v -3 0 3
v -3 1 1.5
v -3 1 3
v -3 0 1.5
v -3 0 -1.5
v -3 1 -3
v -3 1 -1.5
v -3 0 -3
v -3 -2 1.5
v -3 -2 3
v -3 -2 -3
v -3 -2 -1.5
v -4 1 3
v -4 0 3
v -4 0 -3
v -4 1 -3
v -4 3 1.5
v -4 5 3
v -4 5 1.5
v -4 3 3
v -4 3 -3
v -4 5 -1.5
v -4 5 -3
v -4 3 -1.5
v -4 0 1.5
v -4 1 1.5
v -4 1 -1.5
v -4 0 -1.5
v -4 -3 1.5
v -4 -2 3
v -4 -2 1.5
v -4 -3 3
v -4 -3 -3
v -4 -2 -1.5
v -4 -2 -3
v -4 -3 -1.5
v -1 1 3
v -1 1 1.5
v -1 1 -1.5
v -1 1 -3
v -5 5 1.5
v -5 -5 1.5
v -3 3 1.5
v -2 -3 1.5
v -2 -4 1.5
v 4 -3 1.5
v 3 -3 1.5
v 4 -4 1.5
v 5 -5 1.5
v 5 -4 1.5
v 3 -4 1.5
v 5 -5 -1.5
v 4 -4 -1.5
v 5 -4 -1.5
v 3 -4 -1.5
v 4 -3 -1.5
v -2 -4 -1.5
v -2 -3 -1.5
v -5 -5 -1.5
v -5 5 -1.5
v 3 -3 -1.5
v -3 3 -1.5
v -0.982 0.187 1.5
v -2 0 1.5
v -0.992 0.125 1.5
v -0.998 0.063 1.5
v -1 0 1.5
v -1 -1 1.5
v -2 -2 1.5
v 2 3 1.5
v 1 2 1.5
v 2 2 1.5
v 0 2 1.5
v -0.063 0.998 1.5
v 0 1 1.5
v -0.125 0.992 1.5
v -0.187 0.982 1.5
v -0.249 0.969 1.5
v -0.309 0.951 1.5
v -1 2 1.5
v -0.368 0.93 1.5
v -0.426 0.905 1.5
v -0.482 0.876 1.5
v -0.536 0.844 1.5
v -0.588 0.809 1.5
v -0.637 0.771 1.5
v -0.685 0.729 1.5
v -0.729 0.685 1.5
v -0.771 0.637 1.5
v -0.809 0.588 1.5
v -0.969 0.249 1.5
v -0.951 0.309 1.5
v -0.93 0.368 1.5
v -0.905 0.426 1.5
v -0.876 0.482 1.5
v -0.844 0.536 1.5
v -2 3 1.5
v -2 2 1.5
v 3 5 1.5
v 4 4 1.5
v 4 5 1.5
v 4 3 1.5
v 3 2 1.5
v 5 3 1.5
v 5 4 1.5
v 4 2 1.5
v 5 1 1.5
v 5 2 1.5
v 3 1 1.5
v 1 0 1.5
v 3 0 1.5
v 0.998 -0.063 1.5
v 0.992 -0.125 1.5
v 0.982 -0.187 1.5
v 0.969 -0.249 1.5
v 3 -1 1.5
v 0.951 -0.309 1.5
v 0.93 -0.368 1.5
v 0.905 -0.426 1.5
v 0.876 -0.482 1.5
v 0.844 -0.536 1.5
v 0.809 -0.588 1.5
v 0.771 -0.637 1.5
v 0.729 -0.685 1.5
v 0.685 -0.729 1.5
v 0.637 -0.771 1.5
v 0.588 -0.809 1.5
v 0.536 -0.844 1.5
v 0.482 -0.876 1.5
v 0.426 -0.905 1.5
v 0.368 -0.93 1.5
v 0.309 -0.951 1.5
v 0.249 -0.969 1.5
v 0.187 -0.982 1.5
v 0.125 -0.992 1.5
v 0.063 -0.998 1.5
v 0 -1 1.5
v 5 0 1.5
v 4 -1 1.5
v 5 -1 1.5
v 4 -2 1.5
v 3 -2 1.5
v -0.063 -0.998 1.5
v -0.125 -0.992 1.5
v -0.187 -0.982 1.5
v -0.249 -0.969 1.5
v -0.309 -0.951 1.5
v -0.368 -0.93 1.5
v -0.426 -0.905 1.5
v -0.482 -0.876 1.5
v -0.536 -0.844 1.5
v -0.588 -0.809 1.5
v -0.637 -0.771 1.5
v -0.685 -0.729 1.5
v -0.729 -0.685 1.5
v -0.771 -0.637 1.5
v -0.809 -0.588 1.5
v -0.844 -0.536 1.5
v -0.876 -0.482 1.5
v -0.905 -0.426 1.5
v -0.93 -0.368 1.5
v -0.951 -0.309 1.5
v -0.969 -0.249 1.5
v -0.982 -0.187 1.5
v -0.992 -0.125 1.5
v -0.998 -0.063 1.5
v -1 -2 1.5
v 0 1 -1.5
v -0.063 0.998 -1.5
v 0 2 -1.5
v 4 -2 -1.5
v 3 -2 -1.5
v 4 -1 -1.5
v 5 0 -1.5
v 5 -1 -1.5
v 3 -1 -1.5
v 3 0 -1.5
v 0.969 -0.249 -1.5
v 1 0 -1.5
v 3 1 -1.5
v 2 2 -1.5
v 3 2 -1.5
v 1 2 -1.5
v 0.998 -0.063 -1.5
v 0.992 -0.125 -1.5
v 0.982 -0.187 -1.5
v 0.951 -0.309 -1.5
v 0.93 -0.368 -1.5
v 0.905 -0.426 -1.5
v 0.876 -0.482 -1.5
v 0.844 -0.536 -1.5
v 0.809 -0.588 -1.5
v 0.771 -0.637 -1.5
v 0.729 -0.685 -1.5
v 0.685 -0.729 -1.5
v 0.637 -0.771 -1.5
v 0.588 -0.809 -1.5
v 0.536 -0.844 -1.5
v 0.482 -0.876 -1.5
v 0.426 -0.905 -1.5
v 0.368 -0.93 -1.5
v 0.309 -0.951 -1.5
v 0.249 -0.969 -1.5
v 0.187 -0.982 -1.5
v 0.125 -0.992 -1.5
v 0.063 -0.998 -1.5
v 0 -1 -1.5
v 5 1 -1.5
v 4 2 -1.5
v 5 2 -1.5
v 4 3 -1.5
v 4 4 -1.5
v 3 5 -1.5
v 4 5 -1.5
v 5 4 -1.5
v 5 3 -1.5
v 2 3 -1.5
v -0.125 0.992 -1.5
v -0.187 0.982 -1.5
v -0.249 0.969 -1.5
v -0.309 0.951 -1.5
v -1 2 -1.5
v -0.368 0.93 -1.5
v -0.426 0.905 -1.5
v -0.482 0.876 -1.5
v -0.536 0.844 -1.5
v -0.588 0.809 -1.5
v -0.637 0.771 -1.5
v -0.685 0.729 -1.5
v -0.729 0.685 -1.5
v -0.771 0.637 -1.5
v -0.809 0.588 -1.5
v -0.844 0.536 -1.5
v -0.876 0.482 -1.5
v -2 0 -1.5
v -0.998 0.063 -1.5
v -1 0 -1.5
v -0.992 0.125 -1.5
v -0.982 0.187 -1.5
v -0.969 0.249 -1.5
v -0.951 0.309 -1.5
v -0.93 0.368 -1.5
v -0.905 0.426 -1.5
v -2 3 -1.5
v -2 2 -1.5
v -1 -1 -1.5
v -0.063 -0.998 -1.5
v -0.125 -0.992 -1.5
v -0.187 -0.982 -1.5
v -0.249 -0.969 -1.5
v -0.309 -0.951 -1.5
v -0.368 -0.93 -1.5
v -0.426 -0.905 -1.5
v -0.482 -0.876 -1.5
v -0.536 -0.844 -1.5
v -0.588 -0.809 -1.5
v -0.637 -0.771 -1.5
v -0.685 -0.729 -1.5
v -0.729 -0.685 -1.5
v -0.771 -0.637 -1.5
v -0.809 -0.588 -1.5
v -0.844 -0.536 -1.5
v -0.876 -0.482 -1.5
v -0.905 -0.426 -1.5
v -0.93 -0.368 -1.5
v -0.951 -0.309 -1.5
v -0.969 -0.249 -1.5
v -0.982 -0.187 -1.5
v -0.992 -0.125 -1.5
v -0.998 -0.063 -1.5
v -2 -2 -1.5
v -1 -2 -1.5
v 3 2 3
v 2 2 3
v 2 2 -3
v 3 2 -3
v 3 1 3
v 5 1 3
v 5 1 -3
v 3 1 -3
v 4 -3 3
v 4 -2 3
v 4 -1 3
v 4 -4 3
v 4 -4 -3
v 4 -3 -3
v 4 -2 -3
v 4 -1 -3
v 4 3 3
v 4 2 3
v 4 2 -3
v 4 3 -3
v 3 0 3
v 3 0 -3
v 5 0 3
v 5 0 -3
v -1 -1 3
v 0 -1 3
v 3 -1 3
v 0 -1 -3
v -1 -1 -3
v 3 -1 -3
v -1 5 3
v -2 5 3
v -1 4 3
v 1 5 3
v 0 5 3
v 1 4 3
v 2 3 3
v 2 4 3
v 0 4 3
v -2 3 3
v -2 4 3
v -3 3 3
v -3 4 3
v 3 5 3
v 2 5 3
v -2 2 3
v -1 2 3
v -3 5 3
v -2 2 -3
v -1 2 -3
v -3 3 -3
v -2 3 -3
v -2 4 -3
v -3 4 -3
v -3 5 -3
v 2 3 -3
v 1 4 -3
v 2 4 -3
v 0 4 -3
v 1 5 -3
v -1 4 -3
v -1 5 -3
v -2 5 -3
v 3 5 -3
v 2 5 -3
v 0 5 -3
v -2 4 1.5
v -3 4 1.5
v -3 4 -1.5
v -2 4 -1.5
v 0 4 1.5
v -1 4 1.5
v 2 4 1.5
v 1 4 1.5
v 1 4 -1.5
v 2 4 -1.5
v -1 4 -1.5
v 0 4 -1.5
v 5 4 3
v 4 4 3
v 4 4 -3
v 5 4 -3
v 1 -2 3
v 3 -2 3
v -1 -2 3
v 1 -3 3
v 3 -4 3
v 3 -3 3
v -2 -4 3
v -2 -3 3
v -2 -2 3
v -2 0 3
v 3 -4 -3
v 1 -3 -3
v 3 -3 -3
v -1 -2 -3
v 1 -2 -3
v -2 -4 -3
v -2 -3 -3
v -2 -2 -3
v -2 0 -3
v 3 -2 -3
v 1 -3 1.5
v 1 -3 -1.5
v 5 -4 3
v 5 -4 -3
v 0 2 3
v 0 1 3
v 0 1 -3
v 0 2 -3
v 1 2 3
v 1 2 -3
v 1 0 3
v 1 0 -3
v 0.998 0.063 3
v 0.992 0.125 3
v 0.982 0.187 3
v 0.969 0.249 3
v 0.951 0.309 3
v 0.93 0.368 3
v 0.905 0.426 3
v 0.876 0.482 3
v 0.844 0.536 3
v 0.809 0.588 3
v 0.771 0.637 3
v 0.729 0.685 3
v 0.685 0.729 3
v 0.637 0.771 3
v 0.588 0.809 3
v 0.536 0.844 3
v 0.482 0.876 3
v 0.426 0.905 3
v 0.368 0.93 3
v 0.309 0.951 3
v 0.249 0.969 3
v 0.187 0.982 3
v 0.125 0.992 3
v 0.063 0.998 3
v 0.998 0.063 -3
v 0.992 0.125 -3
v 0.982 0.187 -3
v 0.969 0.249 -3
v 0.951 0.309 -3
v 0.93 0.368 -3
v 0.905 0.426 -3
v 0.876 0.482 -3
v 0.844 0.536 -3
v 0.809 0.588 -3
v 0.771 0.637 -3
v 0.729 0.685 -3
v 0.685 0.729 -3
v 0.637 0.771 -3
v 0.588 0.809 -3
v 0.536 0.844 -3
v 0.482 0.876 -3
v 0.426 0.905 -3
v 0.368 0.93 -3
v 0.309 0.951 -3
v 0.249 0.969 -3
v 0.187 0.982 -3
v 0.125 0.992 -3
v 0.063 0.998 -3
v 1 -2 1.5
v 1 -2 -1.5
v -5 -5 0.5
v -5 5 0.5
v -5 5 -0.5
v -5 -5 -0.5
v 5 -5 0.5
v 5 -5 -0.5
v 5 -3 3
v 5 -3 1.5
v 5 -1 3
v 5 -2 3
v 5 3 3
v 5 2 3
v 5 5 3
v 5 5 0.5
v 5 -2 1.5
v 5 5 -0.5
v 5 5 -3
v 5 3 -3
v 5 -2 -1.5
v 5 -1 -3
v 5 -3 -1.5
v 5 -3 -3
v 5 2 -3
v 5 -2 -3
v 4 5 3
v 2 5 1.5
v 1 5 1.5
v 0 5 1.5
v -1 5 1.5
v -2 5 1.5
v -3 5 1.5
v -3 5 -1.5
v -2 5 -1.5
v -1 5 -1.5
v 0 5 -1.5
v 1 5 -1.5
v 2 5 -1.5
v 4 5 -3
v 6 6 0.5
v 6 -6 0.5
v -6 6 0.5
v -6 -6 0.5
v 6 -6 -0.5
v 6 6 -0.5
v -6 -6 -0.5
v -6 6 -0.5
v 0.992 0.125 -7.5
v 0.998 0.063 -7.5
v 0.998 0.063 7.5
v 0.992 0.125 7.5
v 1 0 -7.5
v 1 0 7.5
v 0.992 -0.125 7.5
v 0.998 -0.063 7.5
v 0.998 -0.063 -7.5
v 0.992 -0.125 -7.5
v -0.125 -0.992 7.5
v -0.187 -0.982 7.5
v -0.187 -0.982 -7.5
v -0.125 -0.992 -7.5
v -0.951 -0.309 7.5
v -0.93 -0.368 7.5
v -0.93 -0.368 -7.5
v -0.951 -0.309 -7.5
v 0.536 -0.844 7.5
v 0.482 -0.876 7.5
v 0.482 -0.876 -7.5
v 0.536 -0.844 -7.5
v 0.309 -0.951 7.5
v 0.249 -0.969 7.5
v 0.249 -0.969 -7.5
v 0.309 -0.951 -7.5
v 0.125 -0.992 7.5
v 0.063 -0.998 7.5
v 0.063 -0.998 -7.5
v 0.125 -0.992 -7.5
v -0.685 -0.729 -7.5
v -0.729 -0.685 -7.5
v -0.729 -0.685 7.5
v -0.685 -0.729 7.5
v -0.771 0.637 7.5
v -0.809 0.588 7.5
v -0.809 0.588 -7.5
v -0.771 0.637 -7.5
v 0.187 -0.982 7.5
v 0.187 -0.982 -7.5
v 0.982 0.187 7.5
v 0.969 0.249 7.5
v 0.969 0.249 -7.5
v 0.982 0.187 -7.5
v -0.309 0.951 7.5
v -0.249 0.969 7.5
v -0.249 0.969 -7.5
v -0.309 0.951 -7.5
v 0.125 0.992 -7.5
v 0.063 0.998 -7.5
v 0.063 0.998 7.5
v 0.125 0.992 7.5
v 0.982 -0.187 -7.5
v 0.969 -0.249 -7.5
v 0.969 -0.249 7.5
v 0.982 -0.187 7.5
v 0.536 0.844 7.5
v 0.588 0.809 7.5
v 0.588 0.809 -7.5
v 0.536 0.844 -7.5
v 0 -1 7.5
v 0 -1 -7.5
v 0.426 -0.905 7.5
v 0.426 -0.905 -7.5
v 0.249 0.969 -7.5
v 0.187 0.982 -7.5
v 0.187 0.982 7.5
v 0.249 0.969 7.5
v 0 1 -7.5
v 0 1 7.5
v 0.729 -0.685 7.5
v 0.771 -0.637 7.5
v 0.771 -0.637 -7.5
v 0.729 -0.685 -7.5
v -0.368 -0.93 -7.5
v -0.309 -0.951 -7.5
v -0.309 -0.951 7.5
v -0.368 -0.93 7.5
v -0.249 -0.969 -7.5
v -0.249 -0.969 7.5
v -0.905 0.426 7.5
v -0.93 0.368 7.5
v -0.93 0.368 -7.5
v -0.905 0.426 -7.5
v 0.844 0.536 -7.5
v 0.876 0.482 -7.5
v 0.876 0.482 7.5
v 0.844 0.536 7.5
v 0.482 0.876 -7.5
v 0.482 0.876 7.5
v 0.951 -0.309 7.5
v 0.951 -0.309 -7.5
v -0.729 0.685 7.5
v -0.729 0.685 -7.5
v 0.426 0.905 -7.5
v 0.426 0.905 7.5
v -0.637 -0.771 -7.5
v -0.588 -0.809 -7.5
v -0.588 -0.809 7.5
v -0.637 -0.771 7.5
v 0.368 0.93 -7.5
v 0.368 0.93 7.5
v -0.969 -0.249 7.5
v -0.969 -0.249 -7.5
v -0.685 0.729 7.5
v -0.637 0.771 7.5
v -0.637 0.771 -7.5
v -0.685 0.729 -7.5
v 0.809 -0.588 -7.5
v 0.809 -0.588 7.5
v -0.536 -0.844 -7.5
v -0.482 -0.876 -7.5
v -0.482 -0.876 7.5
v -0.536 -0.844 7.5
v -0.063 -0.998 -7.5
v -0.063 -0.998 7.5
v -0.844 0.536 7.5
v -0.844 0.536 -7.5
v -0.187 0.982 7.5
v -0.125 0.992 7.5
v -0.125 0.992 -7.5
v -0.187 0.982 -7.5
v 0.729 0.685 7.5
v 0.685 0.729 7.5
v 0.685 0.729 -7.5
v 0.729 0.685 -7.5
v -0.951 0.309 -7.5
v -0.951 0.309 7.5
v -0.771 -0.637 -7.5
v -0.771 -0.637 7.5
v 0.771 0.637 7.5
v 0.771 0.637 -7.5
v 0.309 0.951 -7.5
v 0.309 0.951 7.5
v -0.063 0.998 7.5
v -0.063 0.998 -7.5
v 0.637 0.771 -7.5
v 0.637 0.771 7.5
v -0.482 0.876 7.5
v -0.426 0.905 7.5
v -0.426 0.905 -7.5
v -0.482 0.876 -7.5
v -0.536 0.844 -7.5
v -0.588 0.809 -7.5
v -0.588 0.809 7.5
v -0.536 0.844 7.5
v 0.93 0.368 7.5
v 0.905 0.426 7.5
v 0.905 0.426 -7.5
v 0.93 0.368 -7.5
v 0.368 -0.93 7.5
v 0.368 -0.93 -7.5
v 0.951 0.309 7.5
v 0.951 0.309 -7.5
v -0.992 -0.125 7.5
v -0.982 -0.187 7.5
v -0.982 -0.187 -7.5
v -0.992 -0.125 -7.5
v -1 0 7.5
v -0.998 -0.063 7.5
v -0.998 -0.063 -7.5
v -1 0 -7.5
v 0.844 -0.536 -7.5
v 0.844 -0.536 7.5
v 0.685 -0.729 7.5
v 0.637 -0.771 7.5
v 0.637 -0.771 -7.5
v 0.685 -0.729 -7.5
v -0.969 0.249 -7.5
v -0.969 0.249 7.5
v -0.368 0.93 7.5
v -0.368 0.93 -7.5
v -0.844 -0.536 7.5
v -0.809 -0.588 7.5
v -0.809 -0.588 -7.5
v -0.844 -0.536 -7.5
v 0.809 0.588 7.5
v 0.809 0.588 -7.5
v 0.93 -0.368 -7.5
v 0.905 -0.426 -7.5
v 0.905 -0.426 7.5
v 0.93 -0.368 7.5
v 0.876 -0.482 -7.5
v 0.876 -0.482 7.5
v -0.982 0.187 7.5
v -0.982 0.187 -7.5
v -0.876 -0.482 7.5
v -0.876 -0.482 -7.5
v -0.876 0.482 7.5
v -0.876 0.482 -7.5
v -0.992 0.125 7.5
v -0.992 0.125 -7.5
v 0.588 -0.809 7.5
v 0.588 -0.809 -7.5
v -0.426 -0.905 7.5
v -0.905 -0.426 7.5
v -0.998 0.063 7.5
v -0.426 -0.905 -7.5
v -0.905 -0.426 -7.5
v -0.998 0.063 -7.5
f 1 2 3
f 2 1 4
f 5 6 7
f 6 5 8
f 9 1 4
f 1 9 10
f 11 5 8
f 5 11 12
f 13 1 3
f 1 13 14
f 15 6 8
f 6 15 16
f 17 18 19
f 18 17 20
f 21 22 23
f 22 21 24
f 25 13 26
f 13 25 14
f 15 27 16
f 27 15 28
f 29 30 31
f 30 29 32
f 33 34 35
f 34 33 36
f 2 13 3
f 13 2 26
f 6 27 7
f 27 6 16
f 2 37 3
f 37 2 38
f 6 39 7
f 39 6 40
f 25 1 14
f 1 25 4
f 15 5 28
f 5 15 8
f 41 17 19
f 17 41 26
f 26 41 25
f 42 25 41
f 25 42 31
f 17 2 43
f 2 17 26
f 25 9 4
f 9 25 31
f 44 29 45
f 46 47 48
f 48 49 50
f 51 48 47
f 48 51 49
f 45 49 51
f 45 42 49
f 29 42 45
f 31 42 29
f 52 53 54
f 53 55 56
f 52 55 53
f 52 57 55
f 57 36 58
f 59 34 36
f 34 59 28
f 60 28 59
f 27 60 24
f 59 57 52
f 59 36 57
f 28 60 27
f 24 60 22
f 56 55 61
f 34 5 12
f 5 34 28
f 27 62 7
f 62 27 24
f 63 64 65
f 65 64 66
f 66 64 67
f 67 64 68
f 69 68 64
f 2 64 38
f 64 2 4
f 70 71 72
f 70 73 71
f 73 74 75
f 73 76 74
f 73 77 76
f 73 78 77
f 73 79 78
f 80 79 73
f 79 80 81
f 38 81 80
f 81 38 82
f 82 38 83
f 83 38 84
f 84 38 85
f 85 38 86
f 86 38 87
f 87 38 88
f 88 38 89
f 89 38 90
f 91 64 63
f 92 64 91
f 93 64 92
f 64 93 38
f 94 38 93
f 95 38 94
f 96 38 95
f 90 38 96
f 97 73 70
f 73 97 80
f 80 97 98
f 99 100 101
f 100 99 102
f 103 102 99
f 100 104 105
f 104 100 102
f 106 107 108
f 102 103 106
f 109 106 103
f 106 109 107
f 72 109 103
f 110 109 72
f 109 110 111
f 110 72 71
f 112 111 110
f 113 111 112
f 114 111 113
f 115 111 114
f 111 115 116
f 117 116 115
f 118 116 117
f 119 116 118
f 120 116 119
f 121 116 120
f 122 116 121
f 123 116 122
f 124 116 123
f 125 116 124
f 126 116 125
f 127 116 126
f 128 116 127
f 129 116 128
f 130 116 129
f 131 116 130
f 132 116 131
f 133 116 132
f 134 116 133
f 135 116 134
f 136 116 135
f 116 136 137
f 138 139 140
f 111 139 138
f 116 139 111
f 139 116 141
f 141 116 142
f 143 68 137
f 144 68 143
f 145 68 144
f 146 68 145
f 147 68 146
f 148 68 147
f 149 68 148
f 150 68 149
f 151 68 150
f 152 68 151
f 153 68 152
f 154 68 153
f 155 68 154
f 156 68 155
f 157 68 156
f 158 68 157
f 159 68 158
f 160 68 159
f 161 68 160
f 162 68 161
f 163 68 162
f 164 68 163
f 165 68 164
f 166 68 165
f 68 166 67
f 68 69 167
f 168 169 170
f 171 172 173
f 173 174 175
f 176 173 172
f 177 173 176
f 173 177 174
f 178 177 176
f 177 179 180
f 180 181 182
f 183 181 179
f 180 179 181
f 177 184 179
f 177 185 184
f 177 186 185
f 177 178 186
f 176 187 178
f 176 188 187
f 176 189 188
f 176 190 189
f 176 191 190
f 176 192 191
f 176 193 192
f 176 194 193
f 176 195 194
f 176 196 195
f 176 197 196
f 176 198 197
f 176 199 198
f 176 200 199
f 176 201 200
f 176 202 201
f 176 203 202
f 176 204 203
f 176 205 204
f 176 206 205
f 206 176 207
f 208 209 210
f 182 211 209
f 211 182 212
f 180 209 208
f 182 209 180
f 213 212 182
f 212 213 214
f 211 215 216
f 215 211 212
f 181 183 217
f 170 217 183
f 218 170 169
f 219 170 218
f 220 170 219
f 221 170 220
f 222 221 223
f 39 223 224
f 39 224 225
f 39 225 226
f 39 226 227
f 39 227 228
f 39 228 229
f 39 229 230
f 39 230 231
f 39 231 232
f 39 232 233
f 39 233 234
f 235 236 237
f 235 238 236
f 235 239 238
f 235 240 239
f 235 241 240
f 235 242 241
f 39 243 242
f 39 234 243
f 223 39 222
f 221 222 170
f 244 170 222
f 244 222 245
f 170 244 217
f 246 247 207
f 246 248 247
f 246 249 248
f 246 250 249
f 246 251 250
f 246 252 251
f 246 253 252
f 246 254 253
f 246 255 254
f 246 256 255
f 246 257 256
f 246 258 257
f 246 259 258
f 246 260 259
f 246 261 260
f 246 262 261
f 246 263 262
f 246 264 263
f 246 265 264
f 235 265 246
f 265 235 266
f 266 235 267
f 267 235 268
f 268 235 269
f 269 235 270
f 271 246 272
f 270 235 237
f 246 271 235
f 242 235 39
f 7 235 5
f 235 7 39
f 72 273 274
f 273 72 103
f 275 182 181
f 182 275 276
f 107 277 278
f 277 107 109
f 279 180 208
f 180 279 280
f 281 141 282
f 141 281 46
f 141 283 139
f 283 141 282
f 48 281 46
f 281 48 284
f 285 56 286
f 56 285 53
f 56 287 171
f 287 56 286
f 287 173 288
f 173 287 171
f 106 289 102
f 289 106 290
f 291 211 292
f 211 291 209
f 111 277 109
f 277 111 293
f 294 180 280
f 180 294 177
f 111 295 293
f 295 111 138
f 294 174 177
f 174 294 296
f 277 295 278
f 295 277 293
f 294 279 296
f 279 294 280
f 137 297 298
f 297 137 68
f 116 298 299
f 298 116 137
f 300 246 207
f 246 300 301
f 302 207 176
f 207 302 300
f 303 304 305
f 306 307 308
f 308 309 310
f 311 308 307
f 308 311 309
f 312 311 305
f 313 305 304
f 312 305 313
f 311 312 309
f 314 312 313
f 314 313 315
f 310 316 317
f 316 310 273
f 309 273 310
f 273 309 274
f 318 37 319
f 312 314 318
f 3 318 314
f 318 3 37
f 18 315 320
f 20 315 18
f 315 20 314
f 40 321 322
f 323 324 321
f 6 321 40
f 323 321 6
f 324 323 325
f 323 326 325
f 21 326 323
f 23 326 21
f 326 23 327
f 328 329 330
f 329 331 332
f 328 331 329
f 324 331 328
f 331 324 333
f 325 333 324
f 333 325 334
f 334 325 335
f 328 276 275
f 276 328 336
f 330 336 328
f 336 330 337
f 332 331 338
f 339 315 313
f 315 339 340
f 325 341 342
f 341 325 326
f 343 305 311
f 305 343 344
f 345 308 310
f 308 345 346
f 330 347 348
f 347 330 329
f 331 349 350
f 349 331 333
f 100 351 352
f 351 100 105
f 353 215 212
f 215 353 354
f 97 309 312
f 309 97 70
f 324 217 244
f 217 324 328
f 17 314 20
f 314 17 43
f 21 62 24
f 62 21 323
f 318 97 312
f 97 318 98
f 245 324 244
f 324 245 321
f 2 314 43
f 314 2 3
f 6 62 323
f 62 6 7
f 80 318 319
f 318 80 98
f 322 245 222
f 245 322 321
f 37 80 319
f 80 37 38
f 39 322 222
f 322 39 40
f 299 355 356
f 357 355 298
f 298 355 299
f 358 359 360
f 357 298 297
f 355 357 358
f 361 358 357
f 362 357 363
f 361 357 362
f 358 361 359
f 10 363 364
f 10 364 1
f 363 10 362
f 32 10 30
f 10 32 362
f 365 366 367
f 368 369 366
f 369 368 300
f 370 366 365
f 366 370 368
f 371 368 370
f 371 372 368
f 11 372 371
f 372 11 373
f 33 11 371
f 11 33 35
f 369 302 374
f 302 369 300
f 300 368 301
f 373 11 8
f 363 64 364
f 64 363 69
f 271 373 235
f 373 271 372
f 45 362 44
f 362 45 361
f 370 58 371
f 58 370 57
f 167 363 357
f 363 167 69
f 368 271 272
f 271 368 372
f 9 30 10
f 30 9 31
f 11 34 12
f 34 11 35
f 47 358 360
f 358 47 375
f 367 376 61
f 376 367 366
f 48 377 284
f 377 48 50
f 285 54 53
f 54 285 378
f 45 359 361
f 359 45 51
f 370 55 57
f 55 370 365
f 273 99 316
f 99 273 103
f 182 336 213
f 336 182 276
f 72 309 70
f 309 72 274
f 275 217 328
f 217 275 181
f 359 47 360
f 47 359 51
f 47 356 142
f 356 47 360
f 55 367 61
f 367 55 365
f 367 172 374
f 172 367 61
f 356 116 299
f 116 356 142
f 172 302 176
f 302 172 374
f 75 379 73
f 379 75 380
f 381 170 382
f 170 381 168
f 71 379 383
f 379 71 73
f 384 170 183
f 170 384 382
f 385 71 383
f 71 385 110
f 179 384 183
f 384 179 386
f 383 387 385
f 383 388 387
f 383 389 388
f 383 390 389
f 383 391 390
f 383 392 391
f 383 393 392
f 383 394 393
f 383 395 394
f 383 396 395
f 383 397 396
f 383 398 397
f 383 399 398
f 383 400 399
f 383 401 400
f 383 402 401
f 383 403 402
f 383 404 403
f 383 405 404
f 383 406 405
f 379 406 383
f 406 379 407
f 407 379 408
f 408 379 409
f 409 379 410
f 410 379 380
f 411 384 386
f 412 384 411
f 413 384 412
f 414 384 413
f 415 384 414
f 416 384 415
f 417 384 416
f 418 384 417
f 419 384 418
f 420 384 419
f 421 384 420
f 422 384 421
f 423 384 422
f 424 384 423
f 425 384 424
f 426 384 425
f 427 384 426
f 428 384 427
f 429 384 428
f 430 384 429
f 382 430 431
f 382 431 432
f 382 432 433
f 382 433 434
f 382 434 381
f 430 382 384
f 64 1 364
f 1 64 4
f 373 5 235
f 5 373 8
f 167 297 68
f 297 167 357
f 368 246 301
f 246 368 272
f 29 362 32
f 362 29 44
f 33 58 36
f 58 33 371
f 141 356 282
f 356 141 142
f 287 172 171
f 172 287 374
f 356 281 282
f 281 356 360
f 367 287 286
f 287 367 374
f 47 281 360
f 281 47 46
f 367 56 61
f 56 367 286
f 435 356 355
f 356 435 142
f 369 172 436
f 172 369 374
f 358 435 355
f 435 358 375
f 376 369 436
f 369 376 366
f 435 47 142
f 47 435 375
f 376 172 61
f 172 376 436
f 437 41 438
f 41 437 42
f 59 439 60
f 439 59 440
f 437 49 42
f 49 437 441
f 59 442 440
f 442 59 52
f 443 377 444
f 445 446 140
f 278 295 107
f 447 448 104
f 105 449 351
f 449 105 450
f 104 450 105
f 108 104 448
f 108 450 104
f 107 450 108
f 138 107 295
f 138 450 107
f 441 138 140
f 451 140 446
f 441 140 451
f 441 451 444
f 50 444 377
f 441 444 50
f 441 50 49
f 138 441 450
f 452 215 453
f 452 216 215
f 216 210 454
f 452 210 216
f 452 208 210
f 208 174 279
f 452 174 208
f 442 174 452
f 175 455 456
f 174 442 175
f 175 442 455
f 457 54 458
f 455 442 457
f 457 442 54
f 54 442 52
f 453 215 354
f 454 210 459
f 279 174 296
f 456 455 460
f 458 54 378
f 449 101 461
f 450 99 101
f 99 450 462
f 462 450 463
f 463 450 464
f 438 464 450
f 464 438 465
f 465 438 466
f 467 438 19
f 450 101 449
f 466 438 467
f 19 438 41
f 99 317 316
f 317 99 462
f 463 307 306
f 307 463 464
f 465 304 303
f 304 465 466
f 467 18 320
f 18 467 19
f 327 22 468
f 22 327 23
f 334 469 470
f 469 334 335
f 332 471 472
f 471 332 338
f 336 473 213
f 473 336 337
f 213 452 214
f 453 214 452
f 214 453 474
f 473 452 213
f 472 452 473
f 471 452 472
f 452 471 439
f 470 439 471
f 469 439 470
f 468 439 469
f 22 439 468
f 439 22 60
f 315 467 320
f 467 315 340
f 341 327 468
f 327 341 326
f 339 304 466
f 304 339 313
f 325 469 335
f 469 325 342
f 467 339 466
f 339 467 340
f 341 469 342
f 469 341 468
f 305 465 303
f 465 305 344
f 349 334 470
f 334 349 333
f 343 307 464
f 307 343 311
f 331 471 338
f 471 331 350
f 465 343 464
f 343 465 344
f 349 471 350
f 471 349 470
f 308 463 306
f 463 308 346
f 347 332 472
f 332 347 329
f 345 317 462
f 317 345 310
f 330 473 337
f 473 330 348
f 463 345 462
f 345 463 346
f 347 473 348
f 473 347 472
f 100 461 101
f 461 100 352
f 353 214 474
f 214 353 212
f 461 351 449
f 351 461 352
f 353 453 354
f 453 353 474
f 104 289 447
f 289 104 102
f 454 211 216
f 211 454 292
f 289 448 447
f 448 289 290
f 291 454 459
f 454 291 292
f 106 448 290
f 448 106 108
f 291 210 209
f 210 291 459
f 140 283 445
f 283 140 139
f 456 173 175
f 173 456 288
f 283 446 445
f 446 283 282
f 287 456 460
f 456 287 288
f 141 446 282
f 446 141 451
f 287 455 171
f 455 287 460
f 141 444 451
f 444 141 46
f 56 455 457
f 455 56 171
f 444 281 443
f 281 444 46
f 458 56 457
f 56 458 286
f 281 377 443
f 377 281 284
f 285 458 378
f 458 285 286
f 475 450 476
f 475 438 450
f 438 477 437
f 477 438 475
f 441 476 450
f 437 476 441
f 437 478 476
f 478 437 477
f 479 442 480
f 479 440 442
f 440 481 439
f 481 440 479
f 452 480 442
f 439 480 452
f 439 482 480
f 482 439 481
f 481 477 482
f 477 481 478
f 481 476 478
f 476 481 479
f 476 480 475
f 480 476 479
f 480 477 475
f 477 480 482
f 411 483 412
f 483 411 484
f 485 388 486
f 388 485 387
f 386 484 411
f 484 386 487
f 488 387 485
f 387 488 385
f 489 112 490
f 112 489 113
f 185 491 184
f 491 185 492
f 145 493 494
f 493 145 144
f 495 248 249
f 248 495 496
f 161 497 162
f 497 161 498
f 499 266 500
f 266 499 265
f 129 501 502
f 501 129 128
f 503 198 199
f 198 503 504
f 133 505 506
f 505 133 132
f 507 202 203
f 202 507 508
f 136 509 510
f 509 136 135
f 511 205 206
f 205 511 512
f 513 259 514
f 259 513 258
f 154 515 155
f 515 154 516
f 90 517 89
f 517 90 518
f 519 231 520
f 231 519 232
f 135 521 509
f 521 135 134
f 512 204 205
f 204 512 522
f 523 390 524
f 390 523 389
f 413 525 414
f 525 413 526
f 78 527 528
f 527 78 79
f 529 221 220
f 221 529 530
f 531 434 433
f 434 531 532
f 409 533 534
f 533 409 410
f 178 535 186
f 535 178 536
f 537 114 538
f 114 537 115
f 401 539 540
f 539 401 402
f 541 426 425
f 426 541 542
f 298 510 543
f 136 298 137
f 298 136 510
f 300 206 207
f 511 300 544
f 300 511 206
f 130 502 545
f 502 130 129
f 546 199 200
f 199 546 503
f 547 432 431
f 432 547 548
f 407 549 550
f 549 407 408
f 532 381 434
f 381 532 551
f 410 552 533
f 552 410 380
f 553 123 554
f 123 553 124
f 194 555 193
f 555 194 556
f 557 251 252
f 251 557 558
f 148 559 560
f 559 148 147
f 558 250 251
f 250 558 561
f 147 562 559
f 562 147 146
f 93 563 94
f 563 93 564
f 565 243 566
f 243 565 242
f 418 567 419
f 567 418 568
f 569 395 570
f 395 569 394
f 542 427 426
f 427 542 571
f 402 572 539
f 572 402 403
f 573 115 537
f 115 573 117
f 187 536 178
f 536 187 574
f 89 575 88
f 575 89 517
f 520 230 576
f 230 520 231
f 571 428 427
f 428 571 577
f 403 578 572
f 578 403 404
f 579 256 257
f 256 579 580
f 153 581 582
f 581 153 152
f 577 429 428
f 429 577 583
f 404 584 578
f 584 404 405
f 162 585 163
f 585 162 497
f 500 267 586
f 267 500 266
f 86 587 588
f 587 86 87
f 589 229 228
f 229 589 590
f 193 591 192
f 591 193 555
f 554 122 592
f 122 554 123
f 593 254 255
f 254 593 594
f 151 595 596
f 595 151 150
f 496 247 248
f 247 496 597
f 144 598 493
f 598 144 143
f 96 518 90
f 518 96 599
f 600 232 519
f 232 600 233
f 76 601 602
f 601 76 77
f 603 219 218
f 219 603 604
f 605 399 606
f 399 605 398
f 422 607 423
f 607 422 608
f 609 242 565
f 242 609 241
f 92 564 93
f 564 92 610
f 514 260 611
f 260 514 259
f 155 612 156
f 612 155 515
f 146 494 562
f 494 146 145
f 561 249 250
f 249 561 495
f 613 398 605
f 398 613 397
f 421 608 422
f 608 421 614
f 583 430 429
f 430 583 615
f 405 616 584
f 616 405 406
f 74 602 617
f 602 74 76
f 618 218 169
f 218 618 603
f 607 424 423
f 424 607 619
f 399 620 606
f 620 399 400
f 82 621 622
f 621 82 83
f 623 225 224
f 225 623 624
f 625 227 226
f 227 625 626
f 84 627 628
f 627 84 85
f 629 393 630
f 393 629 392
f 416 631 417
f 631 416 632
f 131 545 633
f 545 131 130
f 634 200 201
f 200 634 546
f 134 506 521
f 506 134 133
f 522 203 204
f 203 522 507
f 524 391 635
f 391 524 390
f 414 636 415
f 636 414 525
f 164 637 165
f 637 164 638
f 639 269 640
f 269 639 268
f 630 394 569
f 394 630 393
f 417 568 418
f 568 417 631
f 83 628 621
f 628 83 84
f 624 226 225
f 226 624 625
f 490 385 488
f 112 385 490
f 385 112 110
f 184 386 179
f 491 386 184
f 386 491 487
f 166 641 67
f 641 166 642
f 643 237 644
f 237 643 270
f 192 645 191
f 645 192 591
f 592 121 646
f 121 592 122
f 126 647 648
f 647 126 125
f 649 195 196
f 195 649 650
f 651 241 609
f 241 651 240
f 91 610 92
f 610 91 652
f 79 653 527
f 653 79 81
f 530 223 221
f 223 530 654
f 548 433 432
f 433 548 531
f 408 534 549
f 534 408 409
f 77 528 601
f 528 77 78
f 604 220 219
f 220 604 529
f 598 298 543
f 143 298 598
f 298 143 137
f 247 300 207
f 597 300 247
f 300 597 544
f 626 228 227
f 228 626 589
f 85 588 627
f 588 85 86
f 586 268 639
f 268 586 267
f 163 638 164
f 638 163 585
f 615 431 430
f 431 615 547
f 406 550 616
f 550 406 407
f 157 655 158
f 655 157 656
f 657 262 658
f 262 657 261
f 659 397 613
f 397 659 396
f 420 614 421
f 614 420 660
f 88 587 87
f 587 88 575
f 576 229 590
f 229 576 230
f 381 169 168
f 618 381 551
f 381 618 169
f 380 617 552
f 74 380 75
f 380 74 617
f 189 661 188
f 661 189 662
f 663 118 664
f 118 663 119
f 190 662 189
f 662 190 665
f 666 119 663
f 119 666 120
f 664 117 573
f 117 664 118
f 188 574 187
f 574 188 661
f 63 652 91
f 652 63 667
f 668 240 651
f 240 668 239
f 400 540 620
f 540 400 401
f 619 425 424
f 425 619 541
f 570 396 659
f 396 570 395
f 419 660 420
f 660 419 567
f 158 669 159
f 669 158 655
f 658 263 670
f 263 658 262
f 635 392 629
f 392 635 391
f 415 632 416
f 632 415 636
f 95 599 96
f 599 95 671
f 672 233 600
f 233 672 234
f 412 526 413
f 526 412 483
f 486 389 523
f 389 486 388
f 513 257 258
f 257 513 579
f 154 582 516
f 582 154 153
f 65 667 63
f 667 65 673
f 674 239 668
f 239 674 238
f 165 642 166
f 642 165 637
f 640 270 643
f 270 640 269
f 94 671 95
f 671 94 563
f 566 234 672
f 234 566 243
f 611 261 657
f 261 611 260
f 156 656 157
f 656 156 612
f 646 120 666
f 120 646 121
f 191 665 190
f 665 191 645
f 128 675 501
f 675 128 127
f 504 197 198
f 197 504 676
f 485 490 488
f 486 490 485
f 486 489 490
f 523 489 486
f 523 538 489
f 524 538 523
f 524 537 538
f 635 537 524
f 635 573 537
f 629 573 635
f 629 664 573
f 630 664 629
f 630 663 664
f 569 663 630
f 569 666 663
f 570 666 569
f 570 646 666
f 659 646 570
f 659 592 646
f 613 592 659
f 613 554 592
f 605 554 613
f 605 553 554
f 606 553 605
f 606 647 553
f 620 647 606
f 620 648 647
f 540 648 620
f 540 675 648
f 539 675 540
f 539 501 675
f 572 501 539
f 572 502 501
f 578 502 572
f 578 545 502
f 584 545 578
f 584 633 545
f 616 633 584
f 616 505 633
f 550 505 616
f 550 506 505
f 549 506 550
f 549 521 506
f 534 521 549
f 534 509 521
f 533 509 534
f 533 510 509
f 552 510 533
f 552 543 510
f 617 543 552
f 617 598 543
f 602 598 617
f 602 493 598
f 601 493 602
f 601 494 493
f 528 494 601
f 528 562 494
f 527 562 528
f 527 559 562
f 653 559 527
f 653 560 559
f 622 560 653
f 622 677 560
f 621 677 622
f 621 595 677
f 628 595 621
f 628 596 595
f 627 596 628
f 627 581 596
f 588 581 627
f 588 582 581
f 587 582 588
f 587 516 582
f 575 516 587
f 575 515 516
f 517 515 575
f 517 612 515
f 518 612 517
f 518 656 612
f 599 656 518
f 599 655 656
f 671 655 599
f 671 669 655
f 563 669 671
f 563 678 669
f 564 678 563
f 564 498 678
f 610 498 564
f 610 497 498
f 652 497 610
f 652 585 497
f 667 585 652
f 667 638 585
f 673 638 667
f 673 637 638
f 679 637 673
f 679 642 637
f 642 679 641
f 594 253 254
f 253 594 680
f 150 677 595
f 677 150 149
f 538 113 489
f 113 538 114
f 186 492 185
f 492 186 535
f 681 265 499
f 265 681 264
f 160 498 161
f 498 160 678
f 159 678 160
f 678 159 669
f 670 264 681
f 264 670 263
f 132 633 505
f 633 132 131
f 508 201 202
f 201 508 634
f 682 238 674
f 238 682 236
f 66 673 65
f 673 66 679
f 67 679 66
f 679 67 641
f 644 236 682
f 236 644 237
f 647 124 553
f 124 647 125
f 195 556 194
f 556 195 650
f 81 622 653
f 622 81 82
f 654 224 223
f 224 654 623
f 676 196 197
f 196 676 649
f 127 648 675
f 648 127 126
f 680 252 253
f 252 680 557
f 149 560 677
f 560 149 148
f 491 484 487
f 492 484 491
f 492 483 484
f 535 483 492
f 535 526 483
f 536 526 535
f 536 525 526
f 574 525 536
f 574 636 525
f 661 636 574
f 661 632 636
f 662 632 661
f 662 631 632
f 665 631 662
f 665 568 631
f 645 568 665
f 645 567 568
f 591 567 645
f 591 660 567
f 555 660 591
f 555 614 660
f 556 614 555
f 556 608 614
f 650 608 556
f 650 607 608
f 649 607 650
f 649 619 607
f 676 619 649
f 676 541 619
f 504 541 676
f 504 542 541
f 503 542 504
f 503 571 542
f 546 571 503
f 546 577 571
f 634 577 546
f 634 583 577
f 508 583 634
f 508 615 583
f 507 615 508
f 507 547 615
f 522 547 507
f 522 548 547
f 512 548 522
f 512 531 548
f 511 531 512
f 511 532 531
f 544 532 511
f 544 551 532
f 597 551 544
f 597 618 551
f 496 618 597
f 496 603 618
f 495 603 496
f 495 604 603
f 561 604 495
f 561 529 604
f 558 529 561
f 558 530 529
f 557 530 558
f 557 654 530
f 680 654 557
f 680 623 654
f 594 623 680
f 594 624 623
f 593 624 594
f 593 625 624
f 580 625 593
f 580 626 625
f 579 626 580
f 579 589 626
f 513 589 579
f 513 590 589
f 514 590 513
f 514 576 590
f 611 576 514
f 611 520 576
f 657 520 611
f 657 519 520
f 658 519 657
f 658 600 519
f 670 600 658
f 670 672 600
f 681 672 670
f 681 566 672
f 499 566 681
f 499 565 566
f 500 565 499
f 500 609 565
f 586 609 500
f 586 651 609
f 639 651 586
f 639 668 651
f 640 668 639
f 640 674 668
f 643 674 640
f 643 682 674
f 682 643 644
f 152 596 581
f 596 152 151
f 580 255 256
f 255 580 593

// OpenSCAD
/* Unit Test 18: generalized center=true example */
/* This example shows use of base-256 mode. */
/* The data is a single byte (63=0x3F='?'). */
use <../datamatrix.scad>
data_matrix(
	dm_base256_append(
		[base256_mode()],
		[63],
		fills_symbol=true
	),
	mark=3, space=6, quiet_zone=1, center=true);

/* indicate where the origin is since the images don't show the axes */
cylinder(15, 1, center=true, $fn=100);
